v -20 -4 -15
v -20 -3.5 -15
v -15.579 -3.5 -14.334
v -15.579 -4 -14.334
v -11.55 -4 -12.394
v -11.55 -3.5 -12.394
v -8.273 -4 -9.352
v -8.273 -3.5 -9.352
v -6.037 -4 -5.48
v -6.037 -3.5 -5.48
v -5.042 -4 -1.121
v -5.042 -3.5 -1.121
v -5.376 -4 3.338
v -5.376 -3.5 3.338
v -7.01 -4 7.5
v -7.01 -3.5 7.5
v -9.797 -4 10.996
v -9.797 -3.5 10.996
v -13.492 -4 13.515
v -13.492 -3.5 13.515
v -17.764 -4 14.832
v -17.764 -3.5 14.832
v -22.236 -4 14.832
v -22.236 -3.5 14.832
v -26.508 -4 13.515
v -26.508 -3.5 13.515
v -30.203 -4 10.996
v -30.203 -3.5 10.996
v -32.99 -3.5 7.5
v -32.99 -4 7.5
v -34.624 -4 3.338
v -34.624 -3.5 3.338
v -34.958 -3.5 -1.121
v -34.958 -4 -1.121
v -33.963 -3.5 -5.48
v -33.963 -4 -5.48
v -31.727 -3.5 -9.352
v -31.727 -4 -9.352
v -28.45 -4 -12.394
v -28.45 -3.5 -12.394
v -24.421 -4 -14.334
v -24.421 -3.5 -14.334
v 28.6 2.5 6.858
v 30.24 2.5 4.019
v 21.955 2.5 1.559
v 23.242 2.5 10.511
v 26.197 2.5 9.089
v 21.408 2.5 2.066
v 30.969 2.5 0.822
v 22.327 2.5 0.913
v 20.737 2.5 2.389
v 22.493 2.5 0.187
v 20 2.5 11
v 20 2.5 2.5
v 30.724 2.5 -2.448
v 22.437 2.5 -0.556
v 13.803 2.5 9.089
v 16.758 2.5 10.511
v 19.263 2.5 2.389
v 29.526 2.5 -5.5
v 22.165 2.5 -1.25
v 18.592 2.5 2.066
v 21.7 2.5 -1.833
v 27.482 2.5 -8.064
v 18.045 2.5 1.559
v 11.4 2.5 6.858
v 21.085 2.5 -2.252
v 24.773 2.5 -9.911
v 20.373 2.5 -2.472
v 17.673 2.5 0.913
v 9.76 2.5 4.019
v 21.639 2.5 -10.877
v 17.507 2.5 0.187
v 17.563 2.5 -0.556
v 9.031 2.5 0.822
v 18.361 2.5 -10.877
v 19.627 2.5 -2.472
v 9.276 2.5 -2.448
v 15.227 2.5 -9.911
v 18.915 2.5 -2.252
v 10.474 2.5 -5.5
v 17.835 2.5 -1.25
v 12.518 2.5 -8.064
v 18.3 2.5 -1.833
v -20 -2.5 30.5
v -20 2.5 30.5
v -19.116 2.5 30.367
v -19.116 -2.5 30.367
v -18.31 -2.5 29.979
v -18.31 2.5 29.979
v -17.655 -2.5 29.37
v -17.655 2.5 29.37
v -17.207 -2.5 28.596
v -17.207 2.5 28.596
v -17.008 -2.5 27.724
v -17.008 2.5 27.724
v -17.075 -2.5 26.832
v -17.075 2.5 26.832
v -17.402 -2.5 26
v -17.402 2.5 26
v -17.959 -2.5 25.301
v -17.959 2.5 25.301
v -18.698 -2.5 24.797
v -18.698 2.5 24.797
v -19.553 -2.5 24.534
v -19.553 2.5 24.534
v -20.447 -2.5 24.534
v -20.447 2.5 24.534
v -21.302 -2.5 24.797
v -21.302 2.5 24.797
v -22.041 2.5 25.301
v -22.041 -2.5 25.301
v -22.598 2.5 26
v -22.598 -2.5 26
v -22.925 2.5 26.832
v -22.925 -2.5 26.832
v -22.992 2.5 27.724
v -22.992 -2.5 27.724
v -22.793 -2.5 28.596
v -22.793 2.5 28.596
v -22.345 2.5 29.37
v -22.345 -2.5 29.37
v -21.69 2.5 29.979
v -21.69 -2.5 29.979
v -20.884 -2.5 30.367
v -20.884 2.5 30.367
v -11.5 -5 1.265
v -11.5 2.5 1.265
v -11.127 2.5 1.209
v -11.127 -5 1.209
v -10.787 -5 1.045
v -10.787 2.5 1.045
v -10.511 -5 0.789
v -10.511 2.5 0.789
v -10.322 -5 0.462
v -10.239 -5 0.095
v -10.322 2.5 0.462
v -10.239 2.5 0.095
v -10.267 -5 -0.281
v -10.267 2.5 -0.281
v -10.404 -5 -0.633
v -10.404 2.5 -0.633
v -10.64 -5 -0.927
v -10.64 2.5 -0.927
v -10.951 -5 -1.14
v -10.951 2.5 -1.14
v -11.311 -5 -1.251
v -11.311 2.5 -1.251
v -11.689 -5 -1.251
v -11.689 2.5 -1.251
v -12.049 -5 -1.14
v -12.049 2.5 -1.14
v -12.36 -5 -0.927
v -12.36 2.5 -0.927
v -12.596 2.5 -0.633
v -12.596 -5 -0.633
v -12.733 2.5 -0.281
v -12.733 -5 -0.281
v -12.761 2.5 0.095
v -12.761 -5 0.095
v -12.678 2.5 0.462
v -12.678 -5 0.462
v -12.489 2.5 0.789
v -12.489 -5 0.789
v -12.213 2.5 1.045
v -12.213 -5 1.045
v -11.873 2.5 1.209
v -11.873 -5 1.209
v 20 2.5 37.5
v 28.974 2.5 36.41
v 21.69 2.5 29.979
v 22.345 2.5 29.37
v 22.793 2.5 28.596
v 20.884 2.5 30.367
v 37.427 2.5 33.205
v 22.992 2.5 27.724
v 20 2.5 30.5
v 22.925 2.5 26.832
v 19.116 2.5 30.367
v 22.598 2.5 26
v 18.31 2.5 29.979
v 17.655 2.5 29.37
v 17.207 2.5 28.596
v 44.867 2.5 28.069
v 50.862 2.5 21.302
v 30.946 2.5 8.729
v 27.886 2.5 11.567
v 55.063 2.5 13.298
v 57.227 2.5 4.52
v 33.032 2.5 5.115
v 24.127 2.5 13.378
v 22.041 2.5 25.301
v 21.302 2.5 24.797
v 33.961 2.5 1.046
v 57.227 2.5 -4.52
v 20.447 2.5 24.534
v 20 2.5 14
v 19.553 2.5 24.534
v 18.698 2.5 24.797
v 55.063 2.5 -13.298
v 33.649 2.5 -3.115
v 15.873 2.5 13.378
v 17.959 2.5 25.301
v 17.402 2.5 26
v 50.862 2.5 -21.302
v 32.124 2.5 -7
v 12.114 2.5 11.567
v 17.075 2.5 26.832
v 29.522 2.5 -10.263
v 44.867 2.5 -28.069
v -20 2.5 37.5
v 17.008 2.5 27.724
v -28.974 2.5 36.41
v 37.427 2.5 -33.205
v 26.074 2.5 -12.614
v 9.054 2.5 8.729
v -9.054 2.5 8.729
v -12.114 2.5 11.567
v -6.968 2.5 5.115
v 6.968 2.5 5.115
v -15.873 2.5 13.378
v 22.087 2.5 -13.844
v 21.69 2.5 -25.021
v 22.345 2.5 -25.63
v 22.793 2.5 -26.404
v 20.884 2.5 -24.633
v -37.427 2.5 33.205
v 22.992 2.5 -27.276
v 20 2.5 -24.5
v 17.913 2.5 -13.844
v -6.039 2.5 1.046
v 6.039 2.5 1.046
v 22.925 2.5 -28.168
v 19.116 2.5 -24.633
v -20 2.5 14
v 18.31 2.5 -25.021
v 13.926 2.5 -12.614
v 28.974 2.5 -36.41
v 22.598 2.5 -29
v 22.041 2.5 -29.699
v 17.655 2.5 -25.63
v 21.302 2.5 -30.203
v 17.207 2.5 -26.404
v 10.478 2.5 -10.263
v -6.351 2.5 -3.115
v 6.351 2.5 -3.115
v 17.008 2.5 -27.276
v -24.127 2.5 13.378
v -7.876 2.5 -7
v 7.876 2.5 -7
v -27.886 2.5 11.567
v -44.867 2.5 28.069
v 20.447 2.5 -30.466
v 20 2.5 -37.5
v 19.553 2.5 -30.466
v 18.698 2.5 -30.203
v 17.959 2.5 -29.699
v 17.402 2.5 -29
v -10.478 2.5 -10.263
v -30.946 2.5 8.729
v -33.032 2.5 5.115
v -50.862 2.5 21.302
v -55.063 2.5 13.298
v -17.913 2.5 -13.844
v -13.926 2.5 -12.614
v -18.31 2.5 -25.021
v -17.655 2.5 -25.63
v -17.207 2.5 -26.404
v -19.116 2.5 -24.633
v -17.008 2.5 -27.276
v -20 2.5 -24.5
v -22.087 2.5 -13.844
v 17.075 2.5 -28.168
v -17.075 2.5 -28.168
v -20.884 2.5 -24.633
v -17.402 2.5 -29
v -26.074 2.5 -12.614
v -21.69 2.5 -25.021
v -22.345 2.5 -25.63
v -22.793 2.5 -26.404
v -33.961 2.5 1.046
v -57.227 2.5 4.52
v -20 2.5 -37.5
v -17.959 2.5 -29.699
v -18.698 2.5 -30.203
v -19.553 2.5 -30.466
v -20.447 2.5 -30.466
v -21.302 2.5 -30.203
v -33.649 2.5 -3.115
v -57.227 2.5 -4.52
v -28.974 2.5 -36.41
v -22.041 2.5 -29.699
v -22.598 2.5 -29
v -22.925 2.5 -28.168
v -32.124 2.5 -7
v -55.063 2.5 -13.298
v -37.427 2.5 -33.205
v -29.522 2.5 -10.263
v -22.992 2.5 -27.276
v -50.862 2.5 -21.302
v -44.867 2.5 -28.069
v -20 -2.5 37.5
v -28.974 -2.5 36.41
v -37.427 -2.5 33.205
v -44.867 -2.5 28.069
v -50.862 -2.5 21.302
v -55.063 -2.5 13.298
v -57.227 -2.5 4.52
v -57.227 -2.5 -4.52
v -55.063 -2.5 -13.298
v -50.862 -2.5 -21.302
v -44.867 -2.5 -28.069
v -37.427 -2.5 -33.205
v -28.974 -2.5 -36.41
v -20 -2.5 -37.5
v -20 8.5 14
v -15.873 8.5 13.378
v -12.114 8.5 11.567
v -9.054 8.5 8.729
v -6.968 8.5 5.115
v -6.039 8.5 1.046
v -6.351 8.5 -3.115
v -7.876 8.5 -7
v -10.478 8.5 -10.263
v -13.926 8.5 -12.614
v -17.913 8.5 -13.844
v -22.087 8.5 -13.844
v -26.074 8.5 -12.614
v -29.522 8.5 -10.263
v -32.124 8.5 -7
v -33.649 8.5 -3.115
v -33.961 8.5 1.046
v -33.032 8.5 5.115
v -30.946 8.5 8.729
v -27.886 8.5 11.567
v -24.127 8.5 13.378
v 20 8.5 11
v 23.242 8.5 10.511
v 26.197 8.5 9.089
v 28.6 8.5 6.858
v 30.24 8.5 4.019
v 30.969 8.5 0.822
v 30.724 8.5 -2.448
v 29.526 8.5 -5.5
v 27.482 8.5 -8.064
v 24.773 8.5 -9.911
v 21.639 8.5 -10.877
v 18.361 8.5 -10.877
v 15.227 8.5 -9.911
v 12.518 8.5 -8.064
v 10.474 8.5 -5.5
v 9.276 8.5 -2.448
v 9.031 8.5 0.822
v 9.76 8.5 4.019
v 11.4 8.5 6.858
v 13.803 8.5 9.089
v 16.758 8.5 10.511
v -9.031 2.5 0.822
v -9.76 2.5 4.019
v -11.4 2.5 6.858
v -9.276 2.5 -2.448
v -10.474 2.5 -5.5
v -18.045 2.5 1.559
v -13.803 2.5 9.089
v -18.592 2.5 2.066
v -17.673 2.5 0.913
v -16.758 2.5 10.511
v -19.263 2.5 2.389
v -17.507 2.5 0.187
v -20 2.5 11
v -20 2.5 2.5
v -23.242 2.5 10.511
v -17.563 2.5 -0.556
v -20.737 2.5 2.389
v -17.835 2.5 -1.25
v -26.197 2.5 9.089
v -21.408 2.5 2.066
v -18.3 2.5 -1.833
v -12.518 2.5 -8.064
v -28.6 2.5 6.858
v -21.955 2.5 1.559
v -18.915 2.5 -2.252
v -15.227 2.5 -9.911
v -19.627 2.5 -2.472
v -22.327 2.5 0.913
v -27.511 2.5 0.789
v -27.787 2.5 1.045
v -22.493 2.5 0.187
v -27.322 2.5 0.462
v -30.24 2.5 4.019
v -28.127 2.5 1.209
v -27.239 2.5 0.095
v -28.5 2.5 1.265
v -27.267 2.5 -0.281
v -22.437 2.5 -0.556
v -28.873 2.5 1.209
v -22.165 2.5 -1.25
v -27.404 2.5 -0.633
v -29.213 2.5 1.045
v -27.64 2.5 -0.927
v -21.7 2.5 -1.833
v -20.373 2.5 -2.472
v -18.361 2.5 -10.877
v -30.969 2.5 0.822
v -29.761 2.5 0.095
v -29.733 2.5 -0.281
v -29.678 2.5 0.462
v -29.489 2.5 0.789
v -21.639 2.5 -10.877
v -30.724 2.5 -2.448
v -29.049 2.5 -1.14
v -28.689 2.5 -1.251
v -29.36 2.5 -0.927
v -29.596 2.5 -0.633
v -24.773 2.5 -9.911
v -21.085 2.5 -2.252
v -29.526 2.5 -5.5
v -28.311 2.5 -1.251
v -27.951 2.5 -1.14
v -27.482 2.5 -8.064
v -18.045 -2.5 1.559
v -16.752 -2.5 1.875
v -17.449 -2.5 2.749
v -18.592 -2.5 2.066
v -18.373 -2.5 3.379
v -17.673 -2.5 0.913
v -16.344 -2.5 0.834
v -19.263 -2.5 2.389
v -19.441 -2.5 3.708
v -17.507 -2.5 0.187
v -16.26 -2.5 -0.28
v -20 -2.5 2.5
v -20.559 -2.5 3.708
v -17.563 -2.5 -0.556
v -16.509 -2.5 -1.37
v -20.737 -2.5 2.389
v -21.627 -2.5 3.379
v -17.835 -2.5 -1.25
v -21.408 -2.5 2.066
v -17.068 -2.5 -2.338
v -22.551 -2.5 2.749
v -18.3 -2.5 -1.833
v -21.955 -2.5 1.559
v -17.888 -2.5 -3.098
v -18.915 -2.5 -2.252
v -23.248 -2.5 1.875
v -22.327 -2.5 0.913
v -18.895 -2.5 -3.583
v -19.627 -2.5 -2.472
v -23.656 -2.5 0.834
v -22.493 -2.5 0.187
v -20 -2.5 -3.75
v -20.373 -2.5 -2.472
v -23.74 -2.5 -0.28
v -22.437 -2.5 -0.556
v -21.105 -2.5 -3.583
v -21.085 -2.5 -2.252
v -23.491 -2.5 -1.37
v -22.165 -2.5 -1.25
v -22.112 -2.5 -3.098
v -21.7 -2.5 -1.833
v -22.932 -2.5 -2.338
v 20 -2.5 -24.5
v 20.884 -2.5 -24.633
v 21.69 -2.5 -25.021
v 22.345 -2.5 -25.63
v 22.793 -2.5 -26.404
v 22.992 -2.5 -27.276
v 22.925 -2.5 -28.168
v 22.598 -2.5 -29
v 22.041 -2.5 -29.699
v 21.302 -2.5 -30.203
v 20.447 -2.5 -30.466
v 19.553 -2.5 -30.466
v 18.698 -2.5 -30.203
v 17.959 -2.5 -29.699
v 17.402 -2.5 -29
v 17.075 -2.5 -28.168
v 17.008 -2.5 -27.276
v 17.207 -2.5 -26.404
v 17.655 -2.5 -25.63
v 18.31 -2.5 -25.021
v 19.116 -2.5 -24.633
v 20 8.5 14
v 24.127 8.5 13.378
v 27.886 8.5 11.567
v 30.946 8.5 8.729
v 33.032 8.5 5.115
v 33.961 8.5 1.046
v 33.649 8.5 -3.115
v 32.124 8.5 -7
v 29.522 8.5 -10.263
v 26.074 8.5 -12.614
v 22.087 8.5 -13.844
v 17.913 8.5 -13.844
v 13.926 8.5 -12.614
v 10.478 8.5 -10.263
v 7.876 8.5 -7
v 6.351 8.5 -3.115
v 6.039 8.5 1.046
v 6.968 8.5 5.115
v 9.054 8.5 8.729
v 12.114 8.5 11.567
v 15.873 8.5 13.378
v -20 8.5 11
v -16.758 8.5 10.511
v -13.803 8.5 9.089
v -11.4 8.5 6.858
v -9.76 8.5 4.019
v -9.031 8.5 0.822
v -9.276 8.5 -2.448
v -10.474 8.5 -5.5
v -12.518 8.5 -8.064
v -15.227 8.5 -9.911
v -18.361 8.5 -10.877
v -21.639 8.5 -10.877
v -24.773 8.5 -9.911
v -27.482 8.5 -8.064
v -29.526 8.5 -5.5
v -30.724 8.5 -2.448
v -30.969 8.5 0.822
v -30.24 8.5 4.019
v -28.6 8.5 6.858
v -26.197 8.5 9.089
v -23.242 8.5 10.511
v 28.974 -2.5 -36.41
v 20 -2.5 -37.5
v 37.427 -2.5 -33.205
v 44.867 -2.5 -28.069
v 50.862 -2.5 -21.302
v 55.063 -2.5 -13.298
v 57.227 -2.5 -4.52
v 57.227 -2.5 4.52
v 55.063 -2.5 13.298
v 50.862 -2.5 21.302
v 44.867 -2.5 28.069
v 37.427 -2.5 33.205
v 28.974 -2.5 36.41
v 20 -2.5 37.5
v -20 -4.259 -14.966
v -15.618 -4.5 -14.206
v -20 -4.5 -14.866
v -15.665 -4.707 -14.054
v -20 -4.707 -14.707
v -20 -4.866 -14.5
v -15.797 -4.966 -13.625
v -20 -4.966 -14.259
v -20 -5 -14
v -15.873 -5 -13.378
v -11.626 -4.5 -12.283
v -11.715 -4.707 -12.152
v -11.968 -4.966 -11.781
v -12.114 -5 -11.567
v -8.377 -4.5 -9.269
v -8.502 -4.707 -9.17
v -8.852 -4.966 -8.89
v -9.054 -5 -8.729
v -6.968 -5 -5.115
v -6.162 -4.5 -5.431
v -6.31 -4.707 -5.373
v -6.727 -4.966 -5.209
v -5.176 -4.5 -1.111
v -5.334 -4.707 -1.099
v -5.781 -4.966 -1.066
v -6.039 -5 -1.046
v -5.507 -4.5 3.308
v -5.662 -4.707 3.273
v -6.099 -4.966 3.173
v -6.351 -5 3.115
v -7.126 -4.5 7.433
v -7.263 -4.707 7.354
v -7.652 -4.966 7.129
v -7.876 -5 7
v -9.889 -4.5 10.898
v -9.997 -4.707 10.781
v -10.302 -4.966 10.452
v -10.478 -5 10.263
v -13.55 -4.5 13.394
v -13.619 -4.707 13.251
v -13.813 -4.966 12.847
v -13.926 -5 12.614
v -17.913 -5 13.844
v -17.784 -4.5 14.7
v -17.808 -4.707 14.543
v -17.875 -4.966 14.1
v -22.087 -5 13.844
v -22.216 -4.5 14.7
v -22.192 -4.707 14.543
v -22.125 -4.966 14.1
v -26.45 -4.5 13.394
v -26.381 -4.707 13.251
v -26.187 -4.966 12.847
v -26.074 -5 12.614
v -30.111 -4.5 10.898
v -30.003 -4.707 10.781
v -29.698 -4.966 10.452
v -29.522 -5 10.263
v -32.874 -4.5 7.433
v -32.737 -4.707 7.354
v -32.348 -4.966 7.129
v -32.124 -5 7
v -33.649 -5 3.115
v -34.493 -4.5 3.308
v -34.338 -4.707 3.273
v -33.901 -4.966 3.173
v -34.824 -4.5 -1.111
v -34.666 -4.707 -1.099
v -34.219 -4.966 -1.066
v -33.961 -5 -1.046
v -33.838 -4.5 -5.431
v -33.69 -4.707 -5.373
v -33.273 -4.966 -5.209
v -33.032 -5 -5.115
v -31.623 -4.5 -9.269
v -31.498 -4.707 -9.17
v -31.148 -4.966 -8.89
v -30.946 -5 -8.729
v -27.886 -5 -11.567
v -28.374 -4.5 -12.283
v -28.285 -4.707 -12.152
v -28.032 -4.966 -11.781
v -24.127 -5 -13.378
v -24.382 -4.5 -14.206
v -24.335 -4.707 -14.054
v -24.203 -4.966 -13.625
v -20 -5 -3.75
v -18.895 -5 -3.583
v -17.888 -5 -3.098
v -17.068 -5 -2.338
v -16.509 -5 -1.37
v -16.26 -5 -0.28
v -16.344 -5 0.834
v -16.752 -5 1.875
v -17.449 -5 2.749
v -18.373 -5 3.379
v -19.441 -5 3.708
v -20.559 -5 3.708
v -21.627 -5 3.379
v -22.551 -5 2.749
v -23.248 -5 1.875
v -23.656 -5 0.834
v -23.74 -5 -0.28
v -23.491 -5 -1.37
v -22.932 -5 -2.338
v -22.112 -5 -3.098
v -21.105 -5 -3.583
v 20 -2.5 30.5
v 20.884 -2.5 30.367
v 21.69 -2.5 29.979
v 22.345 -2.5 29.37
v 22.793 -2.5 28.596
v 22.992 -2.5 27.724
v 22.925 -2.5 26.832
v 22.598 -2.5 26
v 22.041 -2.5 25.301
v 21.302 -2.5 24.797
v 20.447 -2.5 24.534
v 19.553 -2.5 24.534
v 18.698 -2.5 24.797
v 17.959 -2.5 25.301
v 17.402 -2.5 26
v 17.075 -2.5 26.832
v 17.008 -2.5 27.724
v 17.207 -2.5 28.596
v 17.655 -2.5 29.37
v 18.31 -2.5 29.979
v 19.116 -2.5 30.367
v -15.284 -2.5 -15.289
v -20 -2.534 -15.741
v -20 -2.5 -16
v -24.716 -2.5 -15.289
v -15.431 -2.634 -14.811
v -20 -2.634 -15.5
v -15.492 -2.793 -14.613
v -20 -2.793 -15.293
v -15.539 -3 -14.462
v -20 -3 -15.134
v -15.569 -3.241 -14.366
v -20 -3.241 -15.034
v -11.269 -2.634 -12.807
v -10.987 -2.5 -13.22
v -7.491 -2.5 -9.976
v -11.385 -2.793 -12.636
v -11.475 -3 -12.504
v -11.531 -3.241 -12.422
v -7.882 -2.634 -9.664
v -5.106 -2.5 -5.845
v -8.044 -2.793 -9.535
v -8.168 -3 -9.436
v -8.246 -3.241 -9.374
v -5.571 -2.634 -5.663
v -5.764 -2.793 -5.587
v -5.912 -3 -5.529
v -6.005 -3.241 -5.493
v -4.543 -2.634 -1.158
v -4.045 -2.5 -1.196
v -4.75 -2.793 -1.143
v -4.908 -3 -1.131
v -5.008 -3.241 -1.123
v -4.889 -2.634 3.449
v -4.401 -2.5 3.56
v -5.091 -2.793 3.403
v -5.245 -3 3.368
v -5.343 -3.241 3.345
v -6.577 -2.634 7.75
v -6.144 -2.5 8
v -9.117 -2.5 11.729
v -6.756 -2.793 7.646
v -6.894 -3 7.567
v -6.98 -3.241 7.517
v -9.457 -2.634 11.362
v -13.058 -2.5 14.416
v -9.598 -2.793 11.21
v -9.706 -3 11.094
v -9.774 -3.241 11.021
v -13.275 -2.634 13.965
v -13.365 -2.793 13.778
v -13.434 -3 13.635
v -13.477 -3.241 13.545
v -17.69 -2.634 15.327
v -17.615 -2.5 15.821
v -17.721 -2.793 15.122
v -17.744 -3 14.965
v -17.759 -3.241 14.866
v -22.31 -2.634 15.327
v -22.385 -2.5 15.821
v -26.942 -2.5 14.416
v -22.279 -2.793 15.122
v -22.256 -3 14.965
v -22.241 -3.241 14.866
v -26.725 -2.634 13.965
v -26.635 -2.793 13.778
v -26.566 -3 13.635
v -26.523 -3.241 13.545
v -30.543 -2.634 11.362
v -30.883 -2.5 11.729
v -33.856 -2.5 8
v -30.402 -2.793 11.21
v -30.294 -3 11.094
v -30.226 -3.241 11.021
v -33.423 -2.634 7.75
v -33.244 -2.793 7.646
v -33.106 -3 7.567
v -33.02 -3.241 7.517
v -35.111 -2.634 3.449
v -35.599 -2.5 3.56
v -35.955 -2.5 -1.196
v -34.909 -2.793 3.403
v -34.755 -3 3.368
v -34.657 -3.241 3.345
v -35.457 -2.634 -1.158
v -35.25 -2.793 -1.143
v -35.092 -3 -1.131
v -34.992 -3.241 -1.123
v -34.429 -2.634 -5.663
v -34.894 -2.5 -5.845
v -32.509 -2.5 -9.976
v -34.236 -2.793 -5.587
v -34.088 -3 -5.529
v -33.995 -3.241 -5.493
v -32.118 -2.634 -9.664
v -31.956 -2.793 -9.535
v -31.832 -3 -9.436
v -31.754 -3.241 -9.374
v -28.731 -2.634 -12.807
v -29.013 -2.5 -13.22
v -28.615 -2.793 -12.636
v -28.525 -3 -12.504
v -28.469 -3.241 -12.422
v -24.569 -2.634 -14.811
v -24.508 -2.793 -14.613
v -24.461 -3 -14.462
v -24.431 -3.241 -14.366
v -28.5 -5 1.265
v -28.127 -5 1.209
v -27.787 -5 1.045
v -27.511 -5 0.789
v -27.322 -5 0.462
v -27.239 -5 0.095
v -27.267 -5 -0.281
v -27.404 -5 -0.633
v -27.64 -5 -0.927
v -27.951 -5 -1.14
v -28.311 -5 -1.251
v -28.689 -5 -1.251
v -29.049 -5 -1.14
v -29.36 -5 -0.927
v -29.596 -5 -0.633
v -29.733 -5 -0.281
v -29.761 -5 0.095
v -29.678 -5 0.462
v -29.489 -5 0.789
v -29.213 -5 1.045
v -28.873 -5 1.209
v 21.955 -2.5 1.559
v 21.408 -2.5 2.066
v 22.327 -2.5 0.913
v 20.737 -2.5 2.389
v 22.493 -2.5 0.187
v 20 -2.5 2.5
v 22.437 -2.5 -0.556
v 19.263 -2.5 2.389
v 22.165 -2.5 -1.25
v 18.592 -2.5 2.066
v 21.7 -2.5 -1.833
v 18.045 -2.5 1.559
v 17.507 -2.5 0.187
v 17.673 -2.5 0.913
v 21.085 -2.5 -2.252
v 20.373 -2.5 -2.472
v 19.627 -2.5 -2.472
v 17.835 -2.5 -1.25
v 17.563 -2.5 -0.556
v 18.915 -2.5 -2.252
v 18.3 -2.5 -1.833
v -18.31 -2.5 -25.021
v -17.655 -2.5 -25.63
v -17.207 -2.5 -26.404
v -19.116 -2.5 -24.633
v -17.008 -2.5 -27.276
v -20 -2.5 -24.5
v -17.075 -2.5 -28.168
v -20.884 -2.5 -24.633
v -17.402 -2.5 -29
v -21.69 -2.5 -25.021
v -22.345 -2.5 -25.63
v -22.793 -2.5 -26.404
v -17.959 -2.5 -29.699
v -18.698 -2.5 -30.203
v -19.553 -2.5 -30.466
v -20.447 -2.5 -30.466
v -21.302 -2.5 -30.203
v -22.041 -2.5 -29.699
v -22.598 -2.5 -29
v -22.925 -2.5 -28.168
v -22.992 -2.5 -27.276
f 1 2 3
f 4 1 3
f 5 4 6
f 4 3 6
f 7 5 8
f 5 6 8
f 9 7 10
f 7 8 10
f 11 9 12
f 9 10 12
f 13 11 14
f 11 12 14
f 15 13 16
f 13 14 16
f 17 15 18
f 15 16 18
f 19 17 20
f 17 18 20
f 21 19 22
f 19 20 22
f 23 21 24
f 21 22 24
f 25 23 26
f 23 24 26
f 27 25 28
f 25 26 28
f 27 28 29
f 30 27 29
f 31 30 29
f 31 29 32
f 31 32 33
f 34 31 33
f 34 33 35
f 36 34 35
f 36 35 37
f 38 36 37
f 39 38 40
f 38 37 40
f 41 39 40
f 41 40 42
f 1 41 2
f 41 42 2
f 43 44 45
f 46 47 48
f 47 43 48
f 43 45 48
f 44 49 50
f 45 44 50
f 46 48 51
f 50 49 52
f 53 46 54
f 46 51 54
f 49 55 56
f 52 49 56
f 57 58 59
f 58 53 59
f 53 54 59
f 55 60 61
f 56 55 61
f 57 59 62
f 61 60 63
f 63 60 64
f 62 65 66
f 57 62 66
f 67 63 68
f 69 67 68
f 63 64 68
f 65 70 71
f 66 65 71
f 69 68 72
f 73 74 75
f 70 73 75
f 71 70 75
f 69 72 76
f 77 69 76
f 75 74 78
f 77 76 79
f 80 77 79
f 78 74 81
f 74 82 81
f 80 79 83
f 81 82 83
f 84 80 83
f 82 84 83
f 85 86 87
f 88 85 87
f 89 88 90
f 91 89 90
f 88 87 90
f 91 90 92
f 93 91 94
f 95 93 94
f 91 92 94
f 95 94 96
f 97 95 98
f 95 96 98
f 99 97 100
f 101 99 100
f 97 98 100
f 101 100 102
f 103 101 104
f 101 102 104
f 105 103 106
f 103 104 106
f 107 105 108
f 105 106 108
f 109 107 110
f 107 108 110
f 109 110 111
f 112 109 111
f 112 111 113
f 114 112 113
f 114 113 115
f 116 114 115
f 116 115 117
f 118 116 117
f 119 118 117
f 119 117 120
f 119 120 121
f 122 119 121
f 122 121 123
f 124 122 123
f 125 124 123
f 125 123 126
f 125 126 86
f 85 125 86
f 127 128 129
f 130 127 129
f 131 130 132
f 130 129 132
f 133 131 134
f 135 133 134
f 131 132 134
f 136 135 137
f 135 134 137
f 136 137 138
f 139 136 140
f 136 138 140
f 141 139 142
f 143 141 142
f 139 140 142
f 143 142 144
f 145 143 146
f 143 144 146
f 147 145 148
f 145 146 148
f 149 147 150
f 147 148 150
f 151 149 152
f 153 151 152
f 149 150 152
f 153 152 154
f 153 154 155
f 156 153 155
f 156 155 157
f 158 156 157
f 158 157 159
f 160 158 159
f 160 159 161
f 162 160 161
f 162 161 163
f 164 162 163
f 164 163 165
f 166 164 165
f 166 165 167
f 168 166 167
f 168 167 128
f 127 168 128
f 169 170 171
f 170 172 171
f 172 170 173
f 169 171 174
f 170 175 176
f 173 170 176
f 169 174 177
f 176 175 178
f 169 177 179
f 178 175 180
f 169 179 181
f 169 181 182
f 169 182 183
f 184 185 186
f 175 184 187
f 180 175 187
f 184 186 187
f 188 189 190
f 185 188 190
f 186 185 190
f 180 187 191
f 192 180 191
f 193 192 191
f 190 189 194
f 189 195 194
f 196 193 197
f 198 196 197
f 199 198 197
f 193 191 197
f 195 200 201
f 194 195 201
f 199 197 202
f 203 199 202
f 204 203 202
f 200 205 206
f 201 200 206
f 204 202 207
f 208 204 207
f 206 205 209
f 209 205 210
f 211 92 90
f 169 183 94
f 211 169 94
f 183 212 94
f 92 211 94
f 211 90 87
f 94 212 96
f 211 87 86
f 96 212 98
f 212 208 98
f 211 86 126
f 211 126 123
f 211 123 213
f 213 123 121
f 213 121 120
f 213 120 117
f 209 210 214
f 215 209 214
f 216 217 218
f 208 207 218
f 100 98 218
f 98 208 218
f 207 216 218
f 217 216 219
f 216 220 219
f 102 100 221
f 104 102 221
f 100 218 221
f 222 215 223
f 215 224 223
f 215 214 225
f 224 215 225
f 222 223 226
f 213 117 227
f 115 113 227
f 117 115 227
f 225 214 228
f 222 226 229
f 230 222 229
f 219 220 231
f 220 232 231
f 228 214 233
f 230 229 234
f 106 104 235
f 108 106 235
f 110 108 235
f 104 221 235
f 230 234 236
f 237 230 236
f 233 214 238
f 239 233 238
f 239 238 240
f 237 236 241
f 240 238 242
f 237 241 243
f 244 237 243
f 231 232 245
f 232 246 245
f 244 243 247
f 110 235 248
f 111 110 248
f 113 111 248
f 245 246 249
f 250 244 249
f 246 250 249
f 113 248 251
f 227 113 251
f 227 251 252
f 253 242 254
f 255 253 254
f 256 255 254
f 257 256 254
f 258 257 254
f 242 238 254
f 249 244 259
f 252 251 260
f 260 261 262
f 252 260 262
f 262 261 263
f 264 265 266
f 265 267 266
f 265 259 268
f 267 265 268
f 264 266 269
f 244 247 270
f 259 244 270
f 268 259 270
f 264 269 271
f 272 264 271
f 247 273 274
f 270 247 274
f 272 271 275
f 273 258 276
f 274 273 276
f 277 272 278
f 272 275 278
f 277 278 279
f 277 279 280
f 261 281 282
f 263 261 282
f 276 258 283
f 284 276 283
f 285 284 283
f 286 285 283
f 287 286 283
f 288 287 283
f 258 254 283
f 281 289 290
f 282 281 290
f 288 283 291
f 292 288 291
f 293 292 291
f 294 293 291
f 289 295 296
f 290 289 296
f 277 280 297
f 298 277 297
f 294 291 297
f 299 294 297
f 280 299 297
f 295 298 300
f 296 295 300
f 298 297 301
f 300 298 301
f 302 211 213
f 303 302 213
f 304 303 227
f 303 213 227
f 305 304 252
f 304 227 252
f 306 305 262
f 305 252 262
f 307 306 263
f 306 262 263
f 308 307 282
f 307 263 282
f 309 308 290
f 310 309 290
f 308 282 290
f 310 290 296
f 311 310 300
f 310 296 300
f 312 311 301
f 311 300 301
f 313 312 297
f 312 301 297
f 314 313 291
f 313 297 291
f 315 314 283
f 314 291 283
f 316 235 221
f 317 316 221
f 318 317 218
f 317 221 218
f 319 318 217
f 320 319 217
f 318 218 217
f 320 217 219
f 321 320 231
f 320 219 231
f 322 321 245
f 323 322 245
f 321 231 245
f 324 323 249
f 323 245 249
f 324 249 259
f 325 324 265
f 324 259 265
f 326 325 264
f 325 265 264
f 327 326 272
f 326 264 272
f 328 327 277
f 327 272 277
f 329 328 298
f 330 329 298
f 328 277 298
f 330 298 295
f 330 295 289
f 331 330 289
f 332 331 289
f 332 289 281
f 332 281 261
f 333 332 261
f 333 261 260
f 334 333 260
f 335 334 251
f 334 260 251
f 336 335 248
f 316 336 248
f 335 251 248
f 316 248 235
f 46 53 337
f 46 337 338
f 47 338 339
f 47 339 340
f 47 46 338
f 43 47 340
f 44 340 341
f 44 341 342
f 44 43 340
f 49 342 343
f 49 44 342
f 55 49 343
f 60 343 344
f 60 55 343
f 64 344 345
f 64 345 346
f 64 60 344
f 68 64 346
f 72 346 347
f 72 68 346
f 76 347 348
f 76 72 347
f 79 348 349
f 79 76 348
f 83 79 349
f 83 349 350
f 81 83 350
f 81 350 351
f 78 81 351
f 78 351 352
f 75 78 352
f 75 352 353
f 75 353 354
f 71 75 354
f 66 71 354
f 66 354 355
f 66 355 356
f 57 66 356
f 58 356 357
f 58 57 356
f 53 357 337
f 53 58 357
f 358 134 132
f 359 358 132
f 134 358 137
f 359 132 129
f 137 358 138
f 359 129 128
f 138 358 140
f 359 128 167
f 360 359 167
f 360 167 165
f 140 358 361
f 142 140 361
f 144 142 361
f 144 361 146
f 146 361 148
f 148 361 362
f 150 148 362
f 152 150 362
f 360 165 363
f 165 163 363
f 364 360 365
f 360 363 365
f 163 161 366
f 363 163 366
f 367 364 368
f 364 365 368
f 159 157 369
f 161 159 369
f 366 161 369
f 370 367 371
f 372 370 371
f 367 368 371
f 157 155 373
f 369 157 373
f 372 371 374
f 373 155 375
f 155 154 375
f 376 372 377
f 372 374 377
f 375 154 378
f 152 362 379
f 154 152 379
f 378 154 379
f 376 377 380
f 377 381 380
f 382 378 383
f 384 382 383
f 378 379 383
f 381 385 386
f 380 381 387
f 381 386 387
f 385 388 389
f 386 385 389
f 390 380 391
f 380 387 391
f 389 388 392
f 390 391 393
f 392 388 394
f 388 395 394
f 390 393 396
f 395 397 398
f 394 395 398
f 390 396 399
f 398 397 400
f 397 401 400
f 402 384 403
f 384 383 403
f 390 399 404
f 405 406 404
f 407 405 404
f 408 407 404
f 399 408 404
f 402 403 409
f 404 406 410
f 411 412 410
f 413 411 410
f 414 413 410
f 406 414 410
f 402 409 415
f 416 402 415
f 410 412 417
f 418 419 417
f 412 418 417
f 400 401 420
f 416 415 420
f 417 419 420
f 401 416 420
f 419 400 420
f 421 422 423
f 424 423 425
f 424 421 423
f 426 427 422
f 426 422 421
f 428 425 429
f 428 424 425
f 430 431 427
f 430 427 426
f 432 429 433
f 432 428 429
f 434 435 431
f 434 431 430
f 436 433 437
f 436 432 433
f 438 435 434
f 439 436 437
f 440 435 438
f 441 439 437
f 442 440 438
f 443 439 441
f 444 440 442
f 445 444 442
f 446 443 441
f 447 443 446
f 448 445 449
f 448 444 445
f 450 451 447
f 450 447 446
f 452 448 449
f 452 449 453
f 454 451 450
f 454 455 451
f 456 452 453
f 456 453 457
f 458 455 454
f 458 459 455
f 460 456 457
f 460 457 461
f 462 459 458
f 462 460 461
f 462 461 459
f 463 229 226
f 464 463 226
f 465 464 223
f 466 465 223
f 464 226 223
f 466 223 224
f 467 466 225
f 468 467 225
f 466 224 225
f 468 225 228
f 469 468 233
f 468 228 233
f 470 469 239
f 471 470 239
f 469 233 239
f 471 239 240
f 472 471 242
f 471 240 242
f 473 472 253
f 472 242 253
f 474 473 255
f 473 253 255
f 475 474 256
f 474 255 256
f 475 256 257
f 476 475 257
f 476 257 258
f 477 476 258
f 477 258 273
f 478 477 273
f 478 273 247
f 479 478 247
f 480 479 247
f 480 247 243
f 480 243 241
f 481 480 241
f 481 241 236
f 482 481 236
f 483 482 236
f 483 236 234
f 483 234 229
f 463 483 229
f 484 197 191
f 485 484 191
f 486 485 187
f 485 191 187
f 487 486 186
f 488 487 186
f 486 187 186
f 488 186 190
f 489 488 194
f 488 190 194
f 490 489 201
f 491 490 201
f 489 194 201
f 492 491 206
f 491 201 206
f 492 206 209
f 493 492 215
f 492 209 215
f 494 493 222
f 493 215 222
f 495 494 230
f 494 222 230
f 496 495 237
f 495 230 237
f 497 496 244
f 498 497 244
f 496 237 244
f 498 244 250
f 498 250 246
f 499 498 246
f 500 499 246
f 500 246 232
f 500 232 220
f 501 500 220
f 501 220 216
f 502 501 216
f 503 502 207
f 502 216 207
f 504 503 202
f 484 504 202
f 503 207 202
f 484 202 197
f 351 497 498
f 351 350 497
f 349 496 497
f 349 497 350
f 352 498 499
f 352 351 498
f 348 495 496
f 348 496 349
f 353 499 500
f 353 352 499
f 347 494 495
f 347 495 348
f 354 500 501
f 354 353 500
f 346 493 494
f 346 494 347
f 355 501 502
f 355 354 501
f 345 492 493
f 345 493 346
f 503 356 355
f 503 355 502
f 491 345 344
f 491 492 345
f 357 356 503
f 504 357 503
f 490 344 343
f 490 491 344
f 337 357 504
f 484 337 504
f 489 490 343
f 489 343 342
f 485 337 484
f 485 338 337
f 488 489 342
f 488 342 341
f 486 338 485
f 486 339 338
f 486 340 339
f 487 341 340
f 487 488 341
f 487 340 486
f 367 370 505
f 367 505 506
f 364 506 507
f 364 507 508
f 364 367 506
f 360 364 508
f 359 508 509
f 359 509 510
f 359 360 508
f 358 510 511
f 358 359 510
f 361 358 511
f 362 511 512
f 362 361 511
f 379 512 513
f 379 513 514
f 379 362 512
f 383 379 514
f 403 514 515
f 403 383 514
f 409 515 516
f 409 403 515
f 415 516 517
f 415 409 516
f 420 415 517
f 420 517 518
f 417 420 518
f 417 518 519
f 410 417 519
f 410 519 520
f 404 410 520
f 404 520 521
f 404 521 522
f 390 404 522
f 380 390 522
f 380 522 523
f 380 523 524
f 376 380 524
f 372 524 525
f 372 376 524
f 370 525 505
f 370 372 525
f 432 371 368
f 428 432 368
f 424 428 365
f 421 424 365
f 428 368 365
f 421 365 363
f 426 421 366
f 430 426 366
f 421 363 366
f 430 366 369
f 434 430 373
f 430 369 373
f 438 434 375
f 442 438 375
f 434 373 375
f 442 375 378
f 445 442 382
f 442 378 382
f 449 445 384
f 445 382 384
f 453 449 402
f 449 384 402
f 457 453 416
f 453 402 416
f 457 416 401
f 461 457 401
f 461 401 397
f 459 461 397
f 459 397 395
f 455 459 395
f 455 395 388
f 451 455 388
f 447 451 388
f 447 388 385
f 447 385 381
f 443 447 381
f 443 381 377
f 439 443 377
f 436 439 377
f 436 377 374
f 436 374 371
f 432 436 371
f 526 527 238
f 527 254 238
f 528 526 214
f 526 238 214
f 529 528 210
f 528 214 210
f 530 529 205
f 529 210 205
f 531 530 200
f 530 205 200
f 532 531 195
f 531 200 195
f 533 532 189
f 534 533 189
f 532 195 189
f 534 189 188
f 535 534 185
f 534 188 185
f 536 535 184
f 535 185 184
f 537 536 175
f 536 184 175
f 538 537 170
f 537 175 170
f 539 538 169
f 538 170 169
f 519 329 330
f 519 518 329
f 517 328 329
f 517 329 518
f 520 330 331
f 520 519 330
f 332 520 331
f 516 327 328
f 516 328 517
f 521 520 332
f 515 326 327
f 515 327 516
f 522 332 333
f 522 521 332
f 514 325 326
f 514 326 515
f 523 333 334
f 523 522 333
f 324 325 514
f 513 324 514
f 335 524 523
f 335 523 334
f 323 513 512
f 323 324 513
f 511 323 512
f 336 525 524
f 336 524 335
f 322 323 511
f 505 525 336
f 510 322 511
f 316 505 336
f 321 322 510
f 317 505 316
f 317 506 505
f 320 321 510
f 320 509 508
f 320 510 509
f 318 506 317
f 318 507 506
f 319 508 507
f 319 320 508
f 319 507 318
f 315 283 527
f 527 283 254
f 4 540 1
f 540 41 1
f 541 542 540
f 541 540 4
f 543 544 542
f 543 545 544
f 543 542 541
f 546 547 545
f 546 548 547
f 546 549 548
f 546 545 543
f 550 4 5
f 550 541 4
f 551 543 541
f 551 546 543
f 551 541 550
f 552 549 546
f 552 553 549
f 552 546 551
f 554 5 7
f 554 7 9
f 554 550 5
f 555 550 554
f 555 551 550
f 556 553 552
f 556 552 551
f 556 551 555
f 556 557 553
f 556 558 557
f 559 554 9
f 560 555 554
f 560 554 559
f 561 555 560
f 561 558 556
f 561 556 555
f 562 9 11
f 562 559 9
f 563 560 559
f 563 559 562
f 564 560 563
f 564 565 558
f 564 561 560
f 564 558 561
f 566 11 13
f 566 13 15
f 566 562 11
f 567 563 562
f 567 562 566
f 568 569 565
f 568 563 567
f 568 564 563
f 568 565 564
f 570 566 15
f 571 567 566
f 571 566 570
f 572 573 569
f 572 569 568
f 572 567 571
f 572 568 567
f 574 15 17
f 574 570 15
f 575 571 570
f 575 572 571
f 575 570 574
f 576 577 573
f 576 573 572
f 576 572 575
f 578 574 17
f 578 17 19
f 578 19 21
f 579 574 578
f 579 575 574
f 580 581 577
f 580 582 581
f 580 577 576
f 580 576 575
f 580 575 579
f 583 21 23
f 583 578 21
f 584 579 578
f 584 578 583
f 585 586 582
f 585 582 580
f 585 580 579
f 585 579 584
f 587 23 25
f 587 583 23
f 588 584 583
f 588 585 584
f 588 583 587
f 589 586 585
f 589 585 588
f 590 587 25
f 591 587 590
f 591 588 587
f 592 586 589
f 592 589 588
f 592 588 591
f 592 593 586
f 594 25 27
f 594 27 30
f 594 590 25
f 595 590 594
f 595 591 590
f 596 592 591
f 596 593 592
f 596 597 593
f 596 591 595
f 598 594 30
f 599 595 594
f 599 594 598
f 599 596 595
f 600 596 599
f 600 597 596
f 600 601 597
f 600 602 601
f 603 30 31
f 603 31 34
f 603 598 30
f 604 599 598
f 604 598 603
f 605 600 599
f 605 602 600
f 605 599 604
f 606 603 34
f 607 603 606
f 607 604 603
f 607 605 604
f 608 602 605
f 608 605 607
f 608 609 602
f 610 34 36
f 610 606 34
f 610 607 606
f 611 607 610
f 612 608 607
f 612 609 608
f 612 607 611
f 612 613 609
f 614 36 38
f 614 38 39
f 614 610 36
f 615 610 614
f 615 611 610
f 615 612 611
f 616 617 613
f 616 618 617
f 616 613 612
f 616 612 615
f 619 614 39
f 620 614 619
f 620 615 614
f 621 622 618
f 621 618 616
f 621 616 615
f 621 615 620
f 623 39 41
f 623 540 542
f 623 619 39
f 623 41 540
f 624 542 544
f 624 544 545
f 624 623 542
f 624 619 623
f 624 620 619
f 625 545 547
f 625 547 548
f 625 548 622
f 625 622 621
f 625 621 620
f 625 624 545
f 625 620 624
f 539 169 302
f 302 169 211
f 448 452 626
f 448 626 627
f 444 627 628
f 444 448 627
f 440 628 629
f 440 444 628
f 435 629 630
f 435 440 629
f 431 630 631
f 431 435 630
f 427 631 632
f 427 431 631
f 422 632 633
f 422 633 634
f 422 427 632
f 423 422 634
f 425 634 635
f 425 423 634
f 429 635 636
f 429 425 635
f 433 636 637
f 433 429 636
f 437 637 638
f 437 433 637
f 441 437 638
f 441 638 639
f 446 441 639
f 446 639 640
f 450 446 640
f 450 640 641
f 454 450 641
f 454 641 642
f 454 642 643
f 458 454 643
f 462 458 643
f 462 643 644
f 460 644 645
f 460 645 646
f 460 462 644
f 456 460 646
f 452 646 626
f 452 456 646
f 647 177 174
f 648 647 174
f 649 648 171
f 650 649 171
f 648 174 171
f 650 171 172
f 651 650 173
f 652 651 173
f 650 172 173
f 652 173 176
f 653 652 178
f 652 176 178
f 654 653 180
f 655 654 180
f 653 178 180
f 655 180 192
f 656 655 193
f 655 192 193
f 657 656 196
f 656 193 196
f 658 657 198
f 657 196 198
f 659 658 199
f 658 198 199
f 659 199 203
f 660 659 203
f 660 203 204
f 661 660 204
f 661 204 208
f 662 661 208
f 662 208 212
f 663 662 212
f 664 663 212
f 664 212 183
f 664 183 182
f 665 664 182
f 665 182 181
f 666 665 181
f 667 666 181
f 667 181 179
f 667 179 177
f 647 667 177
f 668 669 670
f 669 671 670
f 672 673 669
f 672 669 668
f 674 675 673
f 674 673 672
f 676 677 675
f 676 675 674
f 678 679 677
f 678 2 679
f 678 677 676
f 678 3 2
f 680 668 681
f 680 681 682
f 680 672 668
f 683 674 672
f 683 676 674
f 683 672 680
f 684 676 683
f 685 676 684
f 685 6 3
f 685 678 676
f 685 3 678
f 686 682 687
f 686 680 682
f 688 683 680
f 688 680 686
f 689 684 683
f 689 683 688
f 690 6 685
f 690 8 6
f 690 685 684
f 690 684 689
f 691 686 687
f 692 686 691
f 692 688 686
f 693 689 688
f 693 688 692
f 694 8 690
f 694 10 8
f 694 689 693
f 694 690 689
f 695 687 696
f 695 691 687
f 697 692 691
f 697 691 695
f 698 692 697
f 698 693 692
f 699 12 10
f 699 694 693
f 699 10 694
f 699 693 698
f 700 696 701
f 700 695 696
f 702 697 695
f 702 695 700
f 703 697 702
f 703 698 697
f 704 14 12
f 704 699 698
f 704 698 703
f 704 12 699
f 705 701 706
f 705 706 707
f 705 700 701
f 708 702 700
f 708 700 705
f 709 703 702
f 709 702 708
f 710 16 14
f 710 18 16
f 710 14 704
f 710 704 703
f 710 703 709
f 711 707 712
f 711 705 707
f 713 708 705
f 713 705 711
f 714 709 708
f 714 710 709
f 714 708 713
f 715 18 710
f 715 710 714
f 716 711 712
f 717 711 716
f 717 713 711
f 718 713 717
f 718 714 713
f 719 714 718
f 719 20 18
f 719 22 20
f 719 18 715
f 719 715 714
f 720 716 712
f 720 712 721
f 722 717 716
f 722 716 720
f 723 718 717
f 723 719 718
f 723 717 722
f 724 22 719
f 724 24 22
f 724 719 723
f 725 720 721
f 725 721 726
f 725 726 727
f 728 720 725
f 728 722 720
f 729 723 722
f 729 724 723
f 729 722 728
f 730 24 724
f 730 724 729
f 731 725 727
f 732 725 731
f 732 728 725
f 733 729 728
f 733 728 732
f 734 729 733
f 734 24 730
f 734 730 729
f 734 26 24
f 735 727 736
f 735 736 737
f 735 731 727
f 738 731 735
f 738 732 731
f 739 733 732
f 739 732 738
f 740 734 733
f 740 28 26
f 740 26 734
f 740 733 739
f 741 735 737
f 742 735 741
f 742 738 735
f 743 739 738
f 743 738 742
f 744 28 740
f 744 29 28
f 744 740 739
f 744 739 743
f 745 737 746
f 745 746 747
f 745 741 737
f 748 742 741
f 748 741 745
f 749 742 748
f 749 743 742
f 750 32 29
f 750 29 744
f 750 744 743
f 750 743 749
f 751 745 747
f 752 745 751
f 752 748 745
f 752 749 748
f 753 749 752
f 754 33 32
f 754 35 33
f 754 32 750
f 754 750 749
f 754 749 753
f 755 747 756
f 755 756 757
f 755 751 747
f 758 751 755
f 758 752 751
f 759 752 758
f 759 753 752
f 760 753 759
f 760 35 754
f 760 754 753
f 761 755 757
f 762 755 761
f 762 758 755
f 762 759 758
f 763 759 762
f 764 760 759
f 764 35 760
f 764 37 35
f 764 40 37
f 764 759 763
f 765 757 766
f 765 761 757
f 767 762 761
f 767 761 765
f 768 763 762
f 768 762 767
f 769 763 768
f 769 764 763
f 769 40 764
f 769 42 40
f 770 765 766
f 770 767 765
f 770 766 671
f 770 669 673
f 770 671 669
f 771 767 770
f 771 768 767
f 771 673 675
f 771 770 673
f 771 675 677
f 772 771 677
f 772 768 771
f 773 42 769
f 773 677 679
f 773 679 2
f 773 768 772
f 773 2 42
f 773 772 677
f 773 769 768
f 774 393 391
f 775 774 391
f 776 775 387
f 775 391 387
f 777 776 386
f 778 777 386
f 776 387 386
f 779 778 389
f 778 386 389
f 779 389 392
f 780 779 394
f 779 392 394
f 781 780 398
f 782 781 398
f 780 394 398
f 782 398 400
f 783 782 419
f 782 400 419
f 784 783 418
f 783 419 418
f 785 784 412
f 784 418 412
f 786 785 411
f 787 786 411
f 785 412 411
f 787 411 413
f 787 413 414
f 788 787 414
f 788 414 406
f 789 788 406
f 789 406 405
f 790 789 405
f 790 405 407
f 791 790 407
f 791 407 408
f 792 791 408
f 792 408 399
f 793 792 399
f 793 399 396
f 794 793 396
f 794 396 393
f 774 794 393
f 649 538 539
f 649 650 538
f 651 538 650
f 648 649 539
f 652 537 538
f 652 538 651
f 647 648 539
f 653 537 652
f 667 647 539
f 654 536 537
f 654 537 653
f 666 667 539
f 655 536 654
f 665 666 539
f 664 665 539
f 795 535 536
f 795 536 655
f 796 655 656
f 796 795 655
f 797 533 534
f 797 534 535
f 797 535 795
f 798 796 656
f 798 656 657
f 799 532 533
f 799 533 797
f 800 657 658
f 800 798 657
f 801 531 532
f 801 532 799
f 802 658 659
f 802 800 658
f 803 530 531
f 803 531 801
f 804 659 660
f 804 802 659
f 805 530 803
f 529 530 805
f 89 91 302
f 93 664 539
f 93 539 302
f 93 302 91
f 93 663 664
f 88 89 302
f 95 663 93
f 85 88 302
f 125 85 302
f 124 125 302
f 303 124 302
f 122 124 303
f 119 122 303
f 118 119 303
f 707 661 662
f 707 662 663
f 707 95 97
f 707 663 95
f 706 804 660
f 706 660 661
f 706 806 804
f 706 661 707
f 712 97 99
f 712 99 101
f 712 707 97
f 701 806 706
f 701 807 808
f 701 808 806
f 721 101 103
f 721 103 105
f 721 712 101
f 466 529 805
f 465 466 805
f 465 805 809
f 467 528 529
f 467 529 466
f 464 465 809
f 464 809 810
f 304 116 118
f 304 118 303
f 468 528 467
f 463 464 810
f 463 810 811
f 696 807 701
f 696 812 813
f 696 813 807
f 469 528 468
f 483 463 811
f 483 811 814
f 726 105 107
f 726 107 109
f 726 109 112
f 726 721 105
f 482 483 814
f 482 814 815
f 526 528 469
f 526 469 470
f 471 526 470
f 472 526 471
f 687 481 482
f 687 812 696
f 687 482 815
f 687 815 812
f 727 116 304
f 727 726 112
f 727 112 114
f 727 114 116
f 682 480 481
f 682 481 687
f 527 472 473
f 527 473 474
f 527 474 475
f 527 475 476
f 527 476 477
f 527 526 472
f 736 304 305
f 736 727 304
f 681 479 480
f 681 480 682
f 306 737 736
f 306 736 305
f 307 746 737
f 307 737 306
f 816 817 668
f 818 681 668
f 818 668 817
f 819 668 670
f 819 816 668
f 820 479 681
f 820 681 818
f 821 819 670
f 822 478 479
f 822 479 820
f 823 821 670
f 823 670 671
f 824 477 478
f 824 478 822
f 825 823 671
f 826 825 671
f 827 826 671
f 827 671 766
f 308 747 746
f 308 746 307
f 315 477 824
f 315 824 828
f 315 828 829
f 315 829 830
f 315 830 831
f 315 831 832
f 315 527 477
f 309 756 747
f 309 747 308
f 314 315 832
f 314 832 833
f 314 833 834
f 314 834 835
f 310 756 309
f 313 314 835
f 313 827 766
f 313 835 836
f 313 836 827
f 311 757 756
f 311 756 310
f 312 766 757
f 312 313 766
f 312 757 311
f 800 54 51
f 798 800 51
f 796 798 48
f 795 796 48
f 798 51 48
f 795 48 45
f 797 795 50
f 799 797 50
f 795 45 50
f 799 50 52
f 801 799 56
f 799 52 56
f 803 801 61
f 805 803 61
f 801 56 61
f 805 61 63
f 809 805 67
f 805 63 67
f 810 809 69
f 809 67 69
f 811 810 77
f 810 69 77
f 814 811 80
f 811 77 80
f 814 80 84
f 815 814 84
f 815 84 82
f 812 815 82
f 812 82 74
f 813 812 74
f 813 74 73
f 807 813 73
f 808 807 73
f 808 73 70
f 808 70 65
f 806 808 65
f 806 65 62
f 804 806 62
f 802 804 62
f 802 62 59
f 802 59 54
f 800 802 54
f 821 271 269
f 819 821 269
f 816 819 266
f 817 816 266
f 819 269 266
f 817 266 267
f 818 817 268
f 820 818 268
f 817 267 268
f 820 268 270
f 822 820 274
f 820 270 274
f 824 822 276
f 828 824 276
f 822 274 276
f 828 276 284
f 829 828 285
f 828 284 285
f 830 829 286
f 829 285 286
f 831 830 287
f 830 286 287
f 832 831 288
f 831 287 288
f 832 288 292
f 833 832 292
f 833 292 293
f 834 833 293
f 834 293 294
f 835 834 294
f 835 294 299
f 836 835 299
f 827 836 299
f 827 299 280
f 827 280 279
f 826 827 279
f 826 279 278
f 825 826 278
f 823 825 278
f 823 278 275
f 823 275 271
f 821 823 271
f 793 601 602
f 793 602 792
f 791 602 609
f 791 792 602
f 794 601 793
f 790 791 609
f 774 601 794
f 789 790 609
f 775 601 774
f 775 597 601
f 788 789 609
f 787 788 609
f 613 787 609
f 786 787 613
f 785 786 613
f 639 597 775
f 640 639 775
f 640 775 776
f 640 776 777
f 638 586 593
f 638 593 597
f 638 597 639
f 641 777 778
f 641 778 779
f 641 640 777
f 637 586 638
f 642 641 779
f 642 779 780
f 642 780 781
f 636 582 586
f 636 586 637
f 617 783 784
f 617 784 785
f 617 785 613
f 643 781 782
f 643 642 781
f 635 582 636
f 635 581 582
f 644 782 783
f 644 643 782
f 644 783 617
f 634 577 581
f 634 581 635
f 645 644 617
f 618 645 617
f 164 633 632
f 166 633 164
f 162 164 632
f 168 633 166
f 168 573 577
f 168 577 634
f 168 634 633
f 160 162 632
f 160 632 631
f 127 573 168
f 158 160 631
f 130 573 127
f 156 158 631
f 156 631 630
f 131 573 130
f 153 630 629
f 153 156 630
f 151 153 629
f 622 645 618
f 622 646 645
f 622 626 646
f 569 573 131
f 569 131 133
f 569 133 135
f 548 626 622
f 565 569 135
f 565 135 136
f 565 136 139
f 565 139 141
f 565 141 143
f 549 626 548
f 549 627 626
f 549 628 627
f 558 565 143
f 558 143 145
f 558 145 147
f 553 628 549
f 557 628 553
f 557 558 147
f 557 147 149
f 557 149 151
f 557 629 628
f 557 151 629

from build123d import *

# Parameters (mm, degrees)
SALIENTE_EXTRUIR1_DEPTH = 2.5
CROQUIS2_R              = 14
CROQUIS2_R_2            = 11
SALIENTE_EXTRUIR2_DEPTH = 6
CROQUIS8_R              = 15
CROQUIS8_R_2            = 3.75
SALIENTE_EXTRUIR4_DEPTH = 2.5
REDONDEO2_R             = 1
CORTAR_EXTRUIR1_REACH   = 71.056
CROQUIS6_R              = 1.265
CROQUIS6_R_2            = 2.5
CROQUIS6_R_3            = 3


with BuildPart() as part:
    # Croquis1 → Saliente-Extruir1 (new, symmetric)
    with BuildSketch(Plane(origin=(0, 0, 0), x_dir=(1, 0, 0), z_dir=(0, 1, 0))):
        with BuildLine():
            Line((-20, 37.5), (20, 37.5))
            ThreePointArc((20, 37.5), (57.5, 0), (20, -37.5))
            Line((20, -37.5), (-20, -37.5))
            ThreePointArc((-20, -37.5), (-57.5, 0), (-20, 37.5))
        make_face()
    extrude(amount=SALIENTE_EXTRUIR1_DEPTH, both=True)

    # Croquis2 → Saliente-Extruir2 (add)
    # profile 1 of 2: a face of its own
    with BuildSketch(Plane(origin=(0, 2.5, 0), x_dir=(1, 0, 0), z_dir=(0, 1, 0))):
        with Locations(Location((-20, 0, 0), (0, 0, 270))):
            Circle(CROQUIS2_R)
        with Locations(Location((-20, 0, 0), (0, 0, 270))):
            Circle(CROQUIS2_R_2, mode=Mode.SUBTRACT)
    # profile 2 of 2: a face of its own
    with BuildSketch(Plane(origin=(0, 2.5, 0), x_dir=(1, 0, 0), z_dir=(0, 1, 0))):
        with Locations(Location((20, 0, 0), (0, 0, 270))):
            Circle(CROQUIS2_R)
        with Locations(Location((20, 0, 0), (0, 0, 270))):
            Circle(CROQUIS2_R_2, mode=Mode.SUBTRACT)
    extrude(amount=SALIENTE_EXTRUIR2_DEPTH)

    # Croquis8 → Saliente-Extruir4 (add)
    with BuildSketch(Plane.XZ.offset(2.5)):
        with Locations(Location((-20, 0, 0), (0, 0, 270))):
            Circle(CROQUIS8_R)
        with Locations(Location((-20, 0, 0), (0, 0, 270))):
            Circle(CROQUIS8_R_2, mode=Mode.SUBTRACT)
    extrude(amount=SALIENTE_EXTRUIR4_DEPTH)

    # Redondeo2
    redondeo2_edges = [part.edges().sort_by_distance(p)[0] for p in [
        (-20, -2.5, 15),
        (-20, -5, 15),
    ]]
    fillet(redondeo2_edges, radius=REDONDEO2_R)

    # Croquis6 → Cortar-Extruir1 (cut, up to next)
    with BuildSketch(Plane(origin=(0, 2.5, 0), x_dir=(1, 0, 0), z_dir=(0, 1, 0)), mode=Mode.PRIVATE) as cortar_extruir1_sk1:
        with Locations(Location((-28.5, 0, 0), (0, 0, 270))):
            Circle(CROQUIS6_R)
    cortar_extruir1_tool1 = extrude(cortar_extruir1_sk1.sketch, amount=-CORTAR_EXTRUIR1_REACH, mode=Mode.PRIVATE) & part.part
    # Croquis6 → Cortar-Extruir1 (cut, up to next)
    with BuildSketch(Plane(origin=(0, 2.5, 0), x_dir=(1, 0, 0), z_dir=(0, 1, 0)), mode=Mode.PRIVATE) as cortar_extruir1_sk2:
        with Locations(Location((-11.5, 0, 0), (0, 0, 270))):
            Circle(CROQUIS6_R)
    cortar_extruir1_tool2 = extrude(cortar_extruir1_sk2.sketch, amount=-CORTAR_EXTRUIR1_REACH, mode=Mode.PRIVATE) & part.part
    # Croquis6 → Cortar-Extruir1 (cut, up to next)
    with BuildSketch(Plane(origin=(0, 2.5, 0), x_dir=(1, 0, 0), z_dir=(0, 1, 0)), mode=Mode.PRIVATE) as cortar_extruir1_sk3:
        with Locations(Location((-20, 0, 0), (0, 0, 270))):
            Circle(CROQUIS6_R_2)
    cortar_extruir1_tool3 = extrude(cortar_extruir1_sk3.sketch, amount=-CORTAR_EXTRUIR1_REACH, mode=Mode.PRIVATE) & part.part
    # Croquis6 → Cortar-Extruir1 (cut, up to next)
    with BuildSketch(Plane(origin=(0, 2.5, 0), x_dir=(1, 0, 0), z_dir=(0, 1, 0)), mode=Mode.PRIVATE) as cortar_extruir1_sk4:
        with Locations(Location((20, 0, 0), (0, 0, 270))):
            Circle(CROQUIS6_R_2)
    cortar_extruir1_tool4 = extrude(cortar_extruir1_sk4.sketch, amount=-CORTAR_EXTRUIR1_REACH, mode=Mode.PRIVATE) & part.part
    # Croquis6 → Cortar-Extruir1 (cut, up to next)
    with BuildSketch(Plane(origin=(0, 2.5, 0), x_dir=(1, 0, 0), z_dir=(0, 1, 0)), mode=Mode.PRIVATE) as cortar_extruir1_sk5:
        with Locations(Location((-20, 27.5, 0), (0, 0, 270))):
            Circle(CROQUIS6_R_3)
    cortar_extruir1_tool5 = extrude(cortar_extruir1_sk5.sketch, amount=-CORTAR_EXTRUIR1_REACH, mode=Mode.PRIVATE) & part.part
    # Croquis6 → Cortar-Extruir1 (cut, up to next)
    with BuildSketch(Plane(origin=(0, 2.5, 0), x_dir=(1, 0, 0), z_dir=(0, 1, 0)), mode=Mode.PRIVATE) as cortar_extruir1_sk6:
        with Locations(Location((20, 27.5, 0), (0, 0, 270))):
            Circle(CROQUIS6_R_3)
    cortar_extruir1_tool6 = extrude(cortar_extruir1_sk6.sketch, amount=-CORTAR_EXTRUIR1_REACH, mode=Mode.PRIVATE) & part.part
    # Croquis6 → Cortar-Extruir1 (cut, up to next)
    with BuildSketch(Plane(origin=(0, 2.5, 0), x_dir=(1, 0, 0), z_dir=(0, 1, 0)), mode=Mode.PRIVATE) as cortar_extruir1_sk7:
        with Locations(Location((20, -27.5, 0), (0, 0, 270))):
            Circle(CROQUIS6_R_3)
    cortar_extruir1_tool7 = extrude(cortar_extruir1_sk7.sketch, amount=-CORTAR_EXTRUIR1_REACH, mode=Mode.PRIVATE) & part.part
    # Croquis6 → Cortar-Extruir1 (cut, up to next)
    with BuildSketch(Plane(origin=(0, 2.5, 0), x_dir=(1, 0, 0), z_dir=(0, 1, 0)), mode=Mode.PRIVATE) as cortar_extruir1_sk8:
        with Locations(Location((-20, -27.5, 0), (0, 0, 270))):
            Circle(CROQUIS6_R_3)
    cortar_extruir1_tool8 = extrude(cortar_extruir1_sk8.sketch, amount=-CORTAR_EXTRUIR1_REACH, mode=Mode.PRIVATE) & part.part
    add(cortar_extruir1_tool1.solids().sort_by_distance((-28.5, 2.5, 0))[0], mode=Mode.SUBTRACT)
    add(cortar_extruir1_tool2.solids().sort_by_distance((-11.5, 2.5, 0))[0], mode=Mode.SUBTRACT)
    add(cortar_extruir1_tool3.solids().sort_by_distance((-20, 2.5, 0))[0], mode=Mode.SUBTRACT)
    add(cortar_extruir1_tool4.solids().sort_by_distance((20, 2.5, 0))[0], mode=Mode.SUBTRACT)
    add(cortar_extruir1_tool5.solids().sort_by_distance((-20, 2.5, -27.5))[0], mode=Mode.SUBTRACT)
    add(cortar_extruir1_tool6.solids().sort_by_distance((20, 2.5, -27.5))[0], mode=Mode.SUBTRACT)
    add(cortar_extruir1_tool7.solids().sort_by_distance((20, 2.5, 27.5))[0], mode=Mode.SUBTRACT)
    add(cortar_extruir1_tool8.solids().sort_by_distance((-20, 2.5, 27.5))[0], mode=Mode.SUBTRACT)


solid = part.part
